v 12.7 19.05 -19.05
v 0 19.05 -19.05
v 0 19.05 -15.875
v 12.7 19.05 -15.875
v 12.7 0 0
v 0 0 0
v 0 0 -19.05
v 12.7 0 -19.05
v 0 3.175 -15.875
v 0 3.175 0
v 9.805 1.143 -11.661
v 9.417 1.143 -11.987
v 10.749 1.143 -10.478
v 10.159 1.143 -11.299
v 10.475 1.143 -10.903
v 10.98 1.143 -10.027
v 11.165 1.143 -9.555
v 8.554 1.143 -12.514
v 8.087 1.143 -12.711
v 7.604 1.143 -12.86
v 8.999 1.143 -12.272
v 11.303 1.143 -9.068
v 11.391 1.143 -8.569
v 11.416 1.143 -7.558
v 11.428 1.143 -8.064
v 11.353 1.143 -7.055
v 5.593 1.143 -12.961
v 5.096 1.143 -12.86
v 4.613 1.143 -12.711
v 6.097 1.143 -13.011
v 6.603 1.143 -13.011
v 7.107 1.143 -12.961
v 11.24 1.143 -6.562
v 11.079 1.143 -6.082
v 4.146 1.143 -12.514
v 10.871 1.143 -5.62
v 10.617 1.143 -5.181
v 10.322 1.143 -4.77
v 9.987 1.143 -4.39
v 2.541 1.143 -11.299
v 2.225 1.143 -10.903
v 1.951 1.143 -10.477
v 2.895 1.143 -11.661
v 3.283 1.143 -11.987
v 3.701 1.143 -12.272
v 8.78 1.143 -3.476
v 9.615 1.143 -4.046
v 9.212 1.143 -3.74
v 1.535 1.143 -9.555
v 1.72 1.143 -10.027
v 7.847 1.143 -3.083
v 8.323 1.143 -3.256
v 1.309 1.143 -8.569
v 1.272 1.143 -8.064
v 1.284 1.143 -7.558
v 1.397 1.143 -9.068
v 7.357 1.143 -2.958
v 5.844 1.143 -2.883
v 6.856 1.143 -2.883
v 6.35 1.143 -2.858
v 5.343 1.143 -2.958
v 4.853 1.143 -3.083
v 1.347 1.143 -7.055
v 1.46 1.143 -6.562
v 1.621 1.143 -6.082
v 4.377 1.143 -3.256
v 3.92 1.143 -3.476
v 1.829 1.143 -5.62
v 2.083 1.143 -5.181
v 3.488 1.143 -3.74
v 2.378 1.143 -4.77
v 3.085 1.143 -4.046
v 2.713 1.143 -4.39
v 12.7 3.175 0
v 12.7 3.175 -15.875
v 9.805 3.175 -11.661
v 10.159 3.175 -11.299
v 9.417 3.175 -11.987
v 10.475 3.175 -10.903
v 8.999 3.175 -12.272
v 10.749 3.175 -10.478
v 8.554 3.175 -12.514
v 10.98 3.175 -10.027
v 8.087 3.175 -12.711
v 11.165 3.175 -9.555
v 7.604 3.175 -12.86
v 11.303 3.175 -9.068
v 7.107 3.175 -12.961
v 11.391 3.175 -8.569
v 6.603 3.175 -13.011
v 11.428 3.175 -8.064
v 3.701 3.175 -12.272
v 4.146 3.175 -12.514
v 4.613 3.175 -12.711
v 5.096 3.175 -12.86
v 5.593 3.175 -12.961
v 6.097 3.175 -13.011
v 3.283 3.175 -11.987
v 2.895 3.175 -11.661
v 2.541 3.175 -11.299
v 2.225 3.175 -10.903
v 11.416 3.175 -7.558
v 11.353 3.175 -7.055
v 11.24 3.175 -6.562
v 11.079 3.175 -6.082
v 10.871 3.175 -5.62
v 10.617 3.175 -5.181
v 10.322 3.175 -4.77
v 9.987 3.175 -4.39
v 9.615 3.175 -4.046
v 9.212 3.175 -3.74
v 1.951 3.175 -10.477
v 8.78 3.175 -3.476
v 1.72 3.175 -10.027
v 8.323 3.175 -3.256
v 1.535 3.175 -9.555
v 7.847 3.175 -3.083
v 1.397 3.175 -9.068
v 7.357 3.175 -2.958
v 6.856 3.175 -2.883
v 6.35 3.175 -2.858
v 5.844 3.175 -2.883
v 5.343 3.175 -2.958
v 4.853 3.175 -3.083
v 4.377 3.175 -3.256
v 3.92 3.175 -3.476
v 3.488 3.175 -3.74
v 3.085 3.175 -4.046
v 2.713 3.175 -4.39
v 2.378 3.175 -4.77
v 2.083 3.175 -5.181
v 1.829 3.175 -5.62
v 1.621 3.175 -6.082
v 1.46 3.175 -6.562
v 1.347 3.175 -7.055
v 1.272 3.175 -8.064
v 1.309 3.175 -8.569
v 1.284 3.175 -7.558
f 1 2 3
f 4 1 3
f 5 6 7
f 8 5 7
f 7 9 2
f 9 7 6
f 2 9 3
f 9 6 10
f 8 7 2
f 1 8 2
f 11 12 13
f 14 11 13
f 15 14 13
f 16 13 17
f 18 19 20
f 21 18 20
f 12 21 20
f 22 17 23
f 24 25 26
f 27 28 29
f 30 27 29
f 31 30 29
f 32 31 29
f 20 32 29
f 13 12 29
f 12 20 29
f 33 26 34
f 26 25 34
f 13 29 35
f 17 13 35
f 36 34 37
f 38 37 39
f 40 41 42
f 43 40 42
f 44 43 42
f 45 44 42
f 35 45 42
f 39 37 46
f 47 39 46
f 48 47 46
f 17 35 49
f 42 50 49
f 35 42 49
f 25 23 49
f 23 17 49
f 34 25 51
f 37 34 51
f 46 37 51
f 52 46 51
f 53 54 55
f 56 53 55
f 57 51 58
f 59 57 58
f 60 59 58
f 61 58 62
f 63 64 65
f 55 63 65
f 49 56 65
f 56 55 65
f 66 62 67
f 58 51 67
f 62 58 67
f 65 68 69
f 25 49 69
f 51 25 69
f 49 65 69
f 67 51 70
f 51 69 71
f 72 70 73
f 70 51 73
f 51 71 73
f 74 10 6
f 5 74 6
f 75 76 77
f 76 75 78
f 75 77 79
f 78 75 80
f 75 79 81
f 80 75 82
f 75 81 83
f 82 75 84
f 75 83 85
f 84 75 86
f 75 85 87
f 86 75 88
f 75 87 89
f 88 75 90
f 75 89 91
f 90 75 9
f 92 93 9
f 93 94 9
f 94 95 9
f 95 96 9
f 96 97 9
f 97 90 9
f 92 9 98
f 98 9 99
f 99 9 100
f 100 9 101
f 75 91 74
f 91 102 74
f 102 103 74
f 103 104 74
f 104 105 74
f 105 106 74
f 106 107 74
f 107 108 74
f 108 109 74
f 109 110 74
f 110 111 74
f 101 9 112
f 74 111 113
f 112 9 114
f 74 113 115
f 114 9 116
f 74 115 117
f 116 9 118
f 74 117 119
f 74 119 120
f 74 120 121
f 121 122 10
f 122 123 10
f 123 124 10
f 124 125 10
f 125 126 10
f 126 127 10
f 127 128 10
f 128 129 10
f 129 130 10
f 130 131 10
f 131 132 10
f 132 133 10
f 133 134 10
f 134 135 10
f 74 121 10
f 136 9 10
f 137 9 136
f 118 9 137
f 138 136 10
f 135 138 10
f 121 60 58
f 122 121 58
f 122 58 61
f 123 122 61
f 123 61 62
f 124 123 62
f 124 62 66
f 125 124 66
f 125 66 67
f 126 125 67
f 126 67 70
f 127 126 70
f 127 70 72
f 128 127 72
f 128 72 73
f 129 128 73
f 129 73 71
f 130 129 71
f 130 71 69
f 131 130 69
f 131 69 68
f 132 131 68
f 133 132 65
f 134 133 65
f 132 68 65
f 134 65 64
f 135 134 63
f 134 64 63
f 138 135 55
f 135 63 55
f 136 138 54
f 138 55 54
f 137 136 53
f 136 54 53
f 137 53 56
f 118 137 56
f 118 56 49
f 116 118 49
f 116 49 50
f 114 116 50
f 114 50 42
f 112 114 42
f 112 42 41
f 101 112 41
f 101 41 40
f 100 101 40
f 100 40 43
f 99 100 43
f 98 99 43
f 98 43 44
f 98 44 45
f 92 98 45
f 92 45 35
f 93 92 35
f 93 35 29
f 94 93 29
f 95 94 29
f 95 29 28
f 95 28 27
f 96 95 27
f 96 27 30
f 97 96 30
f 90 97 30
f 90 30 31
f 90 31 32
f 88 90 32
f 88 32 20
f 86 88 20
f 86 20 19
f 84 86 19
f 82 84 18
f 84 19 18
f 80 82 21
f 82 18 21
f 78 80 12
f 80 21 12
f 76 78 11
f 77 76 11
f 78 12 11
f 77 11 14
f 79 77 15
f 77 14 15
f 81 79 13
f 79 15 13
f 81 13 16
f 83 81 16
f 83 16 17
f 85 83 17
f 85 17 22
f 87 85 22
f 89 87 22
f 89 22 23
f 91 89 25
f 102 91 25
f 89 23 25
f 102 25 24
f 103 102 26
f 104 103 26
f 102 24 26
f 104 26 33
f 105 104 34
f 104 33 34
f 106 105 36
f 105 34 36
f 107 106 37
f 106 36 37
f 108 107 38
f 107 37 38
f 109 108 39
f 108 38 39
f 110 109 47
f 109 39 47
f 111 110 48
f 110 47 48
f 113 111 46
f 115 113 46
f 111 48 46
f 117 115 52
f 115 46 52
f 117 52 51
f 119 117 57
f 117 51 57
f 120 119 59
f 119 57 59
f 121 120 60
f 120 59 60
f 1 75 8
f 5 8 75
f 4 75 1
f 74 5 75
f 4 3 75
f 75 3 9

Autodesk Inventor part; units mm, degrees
ref_plane "YZ Plane" through (0, 0, 0) normal (1, 0, 0) x (0, 1, 0)
ref_plane "XZ Plane" through (0, 0, 0) normal (0, 1, 0) x (-1, 0, 0)
ref_plane "XY Plane" through (0, 0, 0) normal (0, 0, 1) x (1, 0, 0)
sketch "Sketch1" plane through (0, 0, 0) normal (1, 0, 0) x (0, 1, 0)
  line L0 (0, 0) -> (0, -19.05)
  line L1 (0, -19.05) -> (19.05, -19.05)
  line L2 (19.05, -19.05) -> (19.05, -15.875)
  line L3 (19.05, -15.875) -> (3.175, -15.875)
  line L4 (3.175, -15.875) -> (3.175, 0)
  line L5 (3.175, 0) -> (0, 0)
  dimension "d0" = 3.175
  dimension "d1" = 19.05
  dimension "d4" = 3.175
  dimension "d5" = 19.05
extrude "Extrusion1" add sketch "Sketch1" along normal blind 12.7
sketch "Sketch3" plane through (0, 3.175, 0) normal (0, 1, 0) x (1, 0, 0)
  line L0 (0, 15.875) -> (0, 0) projected
  line L1 (0, 0) -> (12.7, 0) projected
  line L2 (12.7, 15.875) -> (12.7, 0) projected
  line L3 (0, 15.875) -> (12.7, 15.875) projected
  point P0 (0, 0)
  point P1 (6.35, 7.9375)
hole "Hole2" at (6.35, 3.175, -7.9375) direction (0, -1, 0) diameter 10.16 depth 2.032
equation "\"d4\" = d0"
equation "\"d5\" = d1"
properties part number "spring tab for on arm"
